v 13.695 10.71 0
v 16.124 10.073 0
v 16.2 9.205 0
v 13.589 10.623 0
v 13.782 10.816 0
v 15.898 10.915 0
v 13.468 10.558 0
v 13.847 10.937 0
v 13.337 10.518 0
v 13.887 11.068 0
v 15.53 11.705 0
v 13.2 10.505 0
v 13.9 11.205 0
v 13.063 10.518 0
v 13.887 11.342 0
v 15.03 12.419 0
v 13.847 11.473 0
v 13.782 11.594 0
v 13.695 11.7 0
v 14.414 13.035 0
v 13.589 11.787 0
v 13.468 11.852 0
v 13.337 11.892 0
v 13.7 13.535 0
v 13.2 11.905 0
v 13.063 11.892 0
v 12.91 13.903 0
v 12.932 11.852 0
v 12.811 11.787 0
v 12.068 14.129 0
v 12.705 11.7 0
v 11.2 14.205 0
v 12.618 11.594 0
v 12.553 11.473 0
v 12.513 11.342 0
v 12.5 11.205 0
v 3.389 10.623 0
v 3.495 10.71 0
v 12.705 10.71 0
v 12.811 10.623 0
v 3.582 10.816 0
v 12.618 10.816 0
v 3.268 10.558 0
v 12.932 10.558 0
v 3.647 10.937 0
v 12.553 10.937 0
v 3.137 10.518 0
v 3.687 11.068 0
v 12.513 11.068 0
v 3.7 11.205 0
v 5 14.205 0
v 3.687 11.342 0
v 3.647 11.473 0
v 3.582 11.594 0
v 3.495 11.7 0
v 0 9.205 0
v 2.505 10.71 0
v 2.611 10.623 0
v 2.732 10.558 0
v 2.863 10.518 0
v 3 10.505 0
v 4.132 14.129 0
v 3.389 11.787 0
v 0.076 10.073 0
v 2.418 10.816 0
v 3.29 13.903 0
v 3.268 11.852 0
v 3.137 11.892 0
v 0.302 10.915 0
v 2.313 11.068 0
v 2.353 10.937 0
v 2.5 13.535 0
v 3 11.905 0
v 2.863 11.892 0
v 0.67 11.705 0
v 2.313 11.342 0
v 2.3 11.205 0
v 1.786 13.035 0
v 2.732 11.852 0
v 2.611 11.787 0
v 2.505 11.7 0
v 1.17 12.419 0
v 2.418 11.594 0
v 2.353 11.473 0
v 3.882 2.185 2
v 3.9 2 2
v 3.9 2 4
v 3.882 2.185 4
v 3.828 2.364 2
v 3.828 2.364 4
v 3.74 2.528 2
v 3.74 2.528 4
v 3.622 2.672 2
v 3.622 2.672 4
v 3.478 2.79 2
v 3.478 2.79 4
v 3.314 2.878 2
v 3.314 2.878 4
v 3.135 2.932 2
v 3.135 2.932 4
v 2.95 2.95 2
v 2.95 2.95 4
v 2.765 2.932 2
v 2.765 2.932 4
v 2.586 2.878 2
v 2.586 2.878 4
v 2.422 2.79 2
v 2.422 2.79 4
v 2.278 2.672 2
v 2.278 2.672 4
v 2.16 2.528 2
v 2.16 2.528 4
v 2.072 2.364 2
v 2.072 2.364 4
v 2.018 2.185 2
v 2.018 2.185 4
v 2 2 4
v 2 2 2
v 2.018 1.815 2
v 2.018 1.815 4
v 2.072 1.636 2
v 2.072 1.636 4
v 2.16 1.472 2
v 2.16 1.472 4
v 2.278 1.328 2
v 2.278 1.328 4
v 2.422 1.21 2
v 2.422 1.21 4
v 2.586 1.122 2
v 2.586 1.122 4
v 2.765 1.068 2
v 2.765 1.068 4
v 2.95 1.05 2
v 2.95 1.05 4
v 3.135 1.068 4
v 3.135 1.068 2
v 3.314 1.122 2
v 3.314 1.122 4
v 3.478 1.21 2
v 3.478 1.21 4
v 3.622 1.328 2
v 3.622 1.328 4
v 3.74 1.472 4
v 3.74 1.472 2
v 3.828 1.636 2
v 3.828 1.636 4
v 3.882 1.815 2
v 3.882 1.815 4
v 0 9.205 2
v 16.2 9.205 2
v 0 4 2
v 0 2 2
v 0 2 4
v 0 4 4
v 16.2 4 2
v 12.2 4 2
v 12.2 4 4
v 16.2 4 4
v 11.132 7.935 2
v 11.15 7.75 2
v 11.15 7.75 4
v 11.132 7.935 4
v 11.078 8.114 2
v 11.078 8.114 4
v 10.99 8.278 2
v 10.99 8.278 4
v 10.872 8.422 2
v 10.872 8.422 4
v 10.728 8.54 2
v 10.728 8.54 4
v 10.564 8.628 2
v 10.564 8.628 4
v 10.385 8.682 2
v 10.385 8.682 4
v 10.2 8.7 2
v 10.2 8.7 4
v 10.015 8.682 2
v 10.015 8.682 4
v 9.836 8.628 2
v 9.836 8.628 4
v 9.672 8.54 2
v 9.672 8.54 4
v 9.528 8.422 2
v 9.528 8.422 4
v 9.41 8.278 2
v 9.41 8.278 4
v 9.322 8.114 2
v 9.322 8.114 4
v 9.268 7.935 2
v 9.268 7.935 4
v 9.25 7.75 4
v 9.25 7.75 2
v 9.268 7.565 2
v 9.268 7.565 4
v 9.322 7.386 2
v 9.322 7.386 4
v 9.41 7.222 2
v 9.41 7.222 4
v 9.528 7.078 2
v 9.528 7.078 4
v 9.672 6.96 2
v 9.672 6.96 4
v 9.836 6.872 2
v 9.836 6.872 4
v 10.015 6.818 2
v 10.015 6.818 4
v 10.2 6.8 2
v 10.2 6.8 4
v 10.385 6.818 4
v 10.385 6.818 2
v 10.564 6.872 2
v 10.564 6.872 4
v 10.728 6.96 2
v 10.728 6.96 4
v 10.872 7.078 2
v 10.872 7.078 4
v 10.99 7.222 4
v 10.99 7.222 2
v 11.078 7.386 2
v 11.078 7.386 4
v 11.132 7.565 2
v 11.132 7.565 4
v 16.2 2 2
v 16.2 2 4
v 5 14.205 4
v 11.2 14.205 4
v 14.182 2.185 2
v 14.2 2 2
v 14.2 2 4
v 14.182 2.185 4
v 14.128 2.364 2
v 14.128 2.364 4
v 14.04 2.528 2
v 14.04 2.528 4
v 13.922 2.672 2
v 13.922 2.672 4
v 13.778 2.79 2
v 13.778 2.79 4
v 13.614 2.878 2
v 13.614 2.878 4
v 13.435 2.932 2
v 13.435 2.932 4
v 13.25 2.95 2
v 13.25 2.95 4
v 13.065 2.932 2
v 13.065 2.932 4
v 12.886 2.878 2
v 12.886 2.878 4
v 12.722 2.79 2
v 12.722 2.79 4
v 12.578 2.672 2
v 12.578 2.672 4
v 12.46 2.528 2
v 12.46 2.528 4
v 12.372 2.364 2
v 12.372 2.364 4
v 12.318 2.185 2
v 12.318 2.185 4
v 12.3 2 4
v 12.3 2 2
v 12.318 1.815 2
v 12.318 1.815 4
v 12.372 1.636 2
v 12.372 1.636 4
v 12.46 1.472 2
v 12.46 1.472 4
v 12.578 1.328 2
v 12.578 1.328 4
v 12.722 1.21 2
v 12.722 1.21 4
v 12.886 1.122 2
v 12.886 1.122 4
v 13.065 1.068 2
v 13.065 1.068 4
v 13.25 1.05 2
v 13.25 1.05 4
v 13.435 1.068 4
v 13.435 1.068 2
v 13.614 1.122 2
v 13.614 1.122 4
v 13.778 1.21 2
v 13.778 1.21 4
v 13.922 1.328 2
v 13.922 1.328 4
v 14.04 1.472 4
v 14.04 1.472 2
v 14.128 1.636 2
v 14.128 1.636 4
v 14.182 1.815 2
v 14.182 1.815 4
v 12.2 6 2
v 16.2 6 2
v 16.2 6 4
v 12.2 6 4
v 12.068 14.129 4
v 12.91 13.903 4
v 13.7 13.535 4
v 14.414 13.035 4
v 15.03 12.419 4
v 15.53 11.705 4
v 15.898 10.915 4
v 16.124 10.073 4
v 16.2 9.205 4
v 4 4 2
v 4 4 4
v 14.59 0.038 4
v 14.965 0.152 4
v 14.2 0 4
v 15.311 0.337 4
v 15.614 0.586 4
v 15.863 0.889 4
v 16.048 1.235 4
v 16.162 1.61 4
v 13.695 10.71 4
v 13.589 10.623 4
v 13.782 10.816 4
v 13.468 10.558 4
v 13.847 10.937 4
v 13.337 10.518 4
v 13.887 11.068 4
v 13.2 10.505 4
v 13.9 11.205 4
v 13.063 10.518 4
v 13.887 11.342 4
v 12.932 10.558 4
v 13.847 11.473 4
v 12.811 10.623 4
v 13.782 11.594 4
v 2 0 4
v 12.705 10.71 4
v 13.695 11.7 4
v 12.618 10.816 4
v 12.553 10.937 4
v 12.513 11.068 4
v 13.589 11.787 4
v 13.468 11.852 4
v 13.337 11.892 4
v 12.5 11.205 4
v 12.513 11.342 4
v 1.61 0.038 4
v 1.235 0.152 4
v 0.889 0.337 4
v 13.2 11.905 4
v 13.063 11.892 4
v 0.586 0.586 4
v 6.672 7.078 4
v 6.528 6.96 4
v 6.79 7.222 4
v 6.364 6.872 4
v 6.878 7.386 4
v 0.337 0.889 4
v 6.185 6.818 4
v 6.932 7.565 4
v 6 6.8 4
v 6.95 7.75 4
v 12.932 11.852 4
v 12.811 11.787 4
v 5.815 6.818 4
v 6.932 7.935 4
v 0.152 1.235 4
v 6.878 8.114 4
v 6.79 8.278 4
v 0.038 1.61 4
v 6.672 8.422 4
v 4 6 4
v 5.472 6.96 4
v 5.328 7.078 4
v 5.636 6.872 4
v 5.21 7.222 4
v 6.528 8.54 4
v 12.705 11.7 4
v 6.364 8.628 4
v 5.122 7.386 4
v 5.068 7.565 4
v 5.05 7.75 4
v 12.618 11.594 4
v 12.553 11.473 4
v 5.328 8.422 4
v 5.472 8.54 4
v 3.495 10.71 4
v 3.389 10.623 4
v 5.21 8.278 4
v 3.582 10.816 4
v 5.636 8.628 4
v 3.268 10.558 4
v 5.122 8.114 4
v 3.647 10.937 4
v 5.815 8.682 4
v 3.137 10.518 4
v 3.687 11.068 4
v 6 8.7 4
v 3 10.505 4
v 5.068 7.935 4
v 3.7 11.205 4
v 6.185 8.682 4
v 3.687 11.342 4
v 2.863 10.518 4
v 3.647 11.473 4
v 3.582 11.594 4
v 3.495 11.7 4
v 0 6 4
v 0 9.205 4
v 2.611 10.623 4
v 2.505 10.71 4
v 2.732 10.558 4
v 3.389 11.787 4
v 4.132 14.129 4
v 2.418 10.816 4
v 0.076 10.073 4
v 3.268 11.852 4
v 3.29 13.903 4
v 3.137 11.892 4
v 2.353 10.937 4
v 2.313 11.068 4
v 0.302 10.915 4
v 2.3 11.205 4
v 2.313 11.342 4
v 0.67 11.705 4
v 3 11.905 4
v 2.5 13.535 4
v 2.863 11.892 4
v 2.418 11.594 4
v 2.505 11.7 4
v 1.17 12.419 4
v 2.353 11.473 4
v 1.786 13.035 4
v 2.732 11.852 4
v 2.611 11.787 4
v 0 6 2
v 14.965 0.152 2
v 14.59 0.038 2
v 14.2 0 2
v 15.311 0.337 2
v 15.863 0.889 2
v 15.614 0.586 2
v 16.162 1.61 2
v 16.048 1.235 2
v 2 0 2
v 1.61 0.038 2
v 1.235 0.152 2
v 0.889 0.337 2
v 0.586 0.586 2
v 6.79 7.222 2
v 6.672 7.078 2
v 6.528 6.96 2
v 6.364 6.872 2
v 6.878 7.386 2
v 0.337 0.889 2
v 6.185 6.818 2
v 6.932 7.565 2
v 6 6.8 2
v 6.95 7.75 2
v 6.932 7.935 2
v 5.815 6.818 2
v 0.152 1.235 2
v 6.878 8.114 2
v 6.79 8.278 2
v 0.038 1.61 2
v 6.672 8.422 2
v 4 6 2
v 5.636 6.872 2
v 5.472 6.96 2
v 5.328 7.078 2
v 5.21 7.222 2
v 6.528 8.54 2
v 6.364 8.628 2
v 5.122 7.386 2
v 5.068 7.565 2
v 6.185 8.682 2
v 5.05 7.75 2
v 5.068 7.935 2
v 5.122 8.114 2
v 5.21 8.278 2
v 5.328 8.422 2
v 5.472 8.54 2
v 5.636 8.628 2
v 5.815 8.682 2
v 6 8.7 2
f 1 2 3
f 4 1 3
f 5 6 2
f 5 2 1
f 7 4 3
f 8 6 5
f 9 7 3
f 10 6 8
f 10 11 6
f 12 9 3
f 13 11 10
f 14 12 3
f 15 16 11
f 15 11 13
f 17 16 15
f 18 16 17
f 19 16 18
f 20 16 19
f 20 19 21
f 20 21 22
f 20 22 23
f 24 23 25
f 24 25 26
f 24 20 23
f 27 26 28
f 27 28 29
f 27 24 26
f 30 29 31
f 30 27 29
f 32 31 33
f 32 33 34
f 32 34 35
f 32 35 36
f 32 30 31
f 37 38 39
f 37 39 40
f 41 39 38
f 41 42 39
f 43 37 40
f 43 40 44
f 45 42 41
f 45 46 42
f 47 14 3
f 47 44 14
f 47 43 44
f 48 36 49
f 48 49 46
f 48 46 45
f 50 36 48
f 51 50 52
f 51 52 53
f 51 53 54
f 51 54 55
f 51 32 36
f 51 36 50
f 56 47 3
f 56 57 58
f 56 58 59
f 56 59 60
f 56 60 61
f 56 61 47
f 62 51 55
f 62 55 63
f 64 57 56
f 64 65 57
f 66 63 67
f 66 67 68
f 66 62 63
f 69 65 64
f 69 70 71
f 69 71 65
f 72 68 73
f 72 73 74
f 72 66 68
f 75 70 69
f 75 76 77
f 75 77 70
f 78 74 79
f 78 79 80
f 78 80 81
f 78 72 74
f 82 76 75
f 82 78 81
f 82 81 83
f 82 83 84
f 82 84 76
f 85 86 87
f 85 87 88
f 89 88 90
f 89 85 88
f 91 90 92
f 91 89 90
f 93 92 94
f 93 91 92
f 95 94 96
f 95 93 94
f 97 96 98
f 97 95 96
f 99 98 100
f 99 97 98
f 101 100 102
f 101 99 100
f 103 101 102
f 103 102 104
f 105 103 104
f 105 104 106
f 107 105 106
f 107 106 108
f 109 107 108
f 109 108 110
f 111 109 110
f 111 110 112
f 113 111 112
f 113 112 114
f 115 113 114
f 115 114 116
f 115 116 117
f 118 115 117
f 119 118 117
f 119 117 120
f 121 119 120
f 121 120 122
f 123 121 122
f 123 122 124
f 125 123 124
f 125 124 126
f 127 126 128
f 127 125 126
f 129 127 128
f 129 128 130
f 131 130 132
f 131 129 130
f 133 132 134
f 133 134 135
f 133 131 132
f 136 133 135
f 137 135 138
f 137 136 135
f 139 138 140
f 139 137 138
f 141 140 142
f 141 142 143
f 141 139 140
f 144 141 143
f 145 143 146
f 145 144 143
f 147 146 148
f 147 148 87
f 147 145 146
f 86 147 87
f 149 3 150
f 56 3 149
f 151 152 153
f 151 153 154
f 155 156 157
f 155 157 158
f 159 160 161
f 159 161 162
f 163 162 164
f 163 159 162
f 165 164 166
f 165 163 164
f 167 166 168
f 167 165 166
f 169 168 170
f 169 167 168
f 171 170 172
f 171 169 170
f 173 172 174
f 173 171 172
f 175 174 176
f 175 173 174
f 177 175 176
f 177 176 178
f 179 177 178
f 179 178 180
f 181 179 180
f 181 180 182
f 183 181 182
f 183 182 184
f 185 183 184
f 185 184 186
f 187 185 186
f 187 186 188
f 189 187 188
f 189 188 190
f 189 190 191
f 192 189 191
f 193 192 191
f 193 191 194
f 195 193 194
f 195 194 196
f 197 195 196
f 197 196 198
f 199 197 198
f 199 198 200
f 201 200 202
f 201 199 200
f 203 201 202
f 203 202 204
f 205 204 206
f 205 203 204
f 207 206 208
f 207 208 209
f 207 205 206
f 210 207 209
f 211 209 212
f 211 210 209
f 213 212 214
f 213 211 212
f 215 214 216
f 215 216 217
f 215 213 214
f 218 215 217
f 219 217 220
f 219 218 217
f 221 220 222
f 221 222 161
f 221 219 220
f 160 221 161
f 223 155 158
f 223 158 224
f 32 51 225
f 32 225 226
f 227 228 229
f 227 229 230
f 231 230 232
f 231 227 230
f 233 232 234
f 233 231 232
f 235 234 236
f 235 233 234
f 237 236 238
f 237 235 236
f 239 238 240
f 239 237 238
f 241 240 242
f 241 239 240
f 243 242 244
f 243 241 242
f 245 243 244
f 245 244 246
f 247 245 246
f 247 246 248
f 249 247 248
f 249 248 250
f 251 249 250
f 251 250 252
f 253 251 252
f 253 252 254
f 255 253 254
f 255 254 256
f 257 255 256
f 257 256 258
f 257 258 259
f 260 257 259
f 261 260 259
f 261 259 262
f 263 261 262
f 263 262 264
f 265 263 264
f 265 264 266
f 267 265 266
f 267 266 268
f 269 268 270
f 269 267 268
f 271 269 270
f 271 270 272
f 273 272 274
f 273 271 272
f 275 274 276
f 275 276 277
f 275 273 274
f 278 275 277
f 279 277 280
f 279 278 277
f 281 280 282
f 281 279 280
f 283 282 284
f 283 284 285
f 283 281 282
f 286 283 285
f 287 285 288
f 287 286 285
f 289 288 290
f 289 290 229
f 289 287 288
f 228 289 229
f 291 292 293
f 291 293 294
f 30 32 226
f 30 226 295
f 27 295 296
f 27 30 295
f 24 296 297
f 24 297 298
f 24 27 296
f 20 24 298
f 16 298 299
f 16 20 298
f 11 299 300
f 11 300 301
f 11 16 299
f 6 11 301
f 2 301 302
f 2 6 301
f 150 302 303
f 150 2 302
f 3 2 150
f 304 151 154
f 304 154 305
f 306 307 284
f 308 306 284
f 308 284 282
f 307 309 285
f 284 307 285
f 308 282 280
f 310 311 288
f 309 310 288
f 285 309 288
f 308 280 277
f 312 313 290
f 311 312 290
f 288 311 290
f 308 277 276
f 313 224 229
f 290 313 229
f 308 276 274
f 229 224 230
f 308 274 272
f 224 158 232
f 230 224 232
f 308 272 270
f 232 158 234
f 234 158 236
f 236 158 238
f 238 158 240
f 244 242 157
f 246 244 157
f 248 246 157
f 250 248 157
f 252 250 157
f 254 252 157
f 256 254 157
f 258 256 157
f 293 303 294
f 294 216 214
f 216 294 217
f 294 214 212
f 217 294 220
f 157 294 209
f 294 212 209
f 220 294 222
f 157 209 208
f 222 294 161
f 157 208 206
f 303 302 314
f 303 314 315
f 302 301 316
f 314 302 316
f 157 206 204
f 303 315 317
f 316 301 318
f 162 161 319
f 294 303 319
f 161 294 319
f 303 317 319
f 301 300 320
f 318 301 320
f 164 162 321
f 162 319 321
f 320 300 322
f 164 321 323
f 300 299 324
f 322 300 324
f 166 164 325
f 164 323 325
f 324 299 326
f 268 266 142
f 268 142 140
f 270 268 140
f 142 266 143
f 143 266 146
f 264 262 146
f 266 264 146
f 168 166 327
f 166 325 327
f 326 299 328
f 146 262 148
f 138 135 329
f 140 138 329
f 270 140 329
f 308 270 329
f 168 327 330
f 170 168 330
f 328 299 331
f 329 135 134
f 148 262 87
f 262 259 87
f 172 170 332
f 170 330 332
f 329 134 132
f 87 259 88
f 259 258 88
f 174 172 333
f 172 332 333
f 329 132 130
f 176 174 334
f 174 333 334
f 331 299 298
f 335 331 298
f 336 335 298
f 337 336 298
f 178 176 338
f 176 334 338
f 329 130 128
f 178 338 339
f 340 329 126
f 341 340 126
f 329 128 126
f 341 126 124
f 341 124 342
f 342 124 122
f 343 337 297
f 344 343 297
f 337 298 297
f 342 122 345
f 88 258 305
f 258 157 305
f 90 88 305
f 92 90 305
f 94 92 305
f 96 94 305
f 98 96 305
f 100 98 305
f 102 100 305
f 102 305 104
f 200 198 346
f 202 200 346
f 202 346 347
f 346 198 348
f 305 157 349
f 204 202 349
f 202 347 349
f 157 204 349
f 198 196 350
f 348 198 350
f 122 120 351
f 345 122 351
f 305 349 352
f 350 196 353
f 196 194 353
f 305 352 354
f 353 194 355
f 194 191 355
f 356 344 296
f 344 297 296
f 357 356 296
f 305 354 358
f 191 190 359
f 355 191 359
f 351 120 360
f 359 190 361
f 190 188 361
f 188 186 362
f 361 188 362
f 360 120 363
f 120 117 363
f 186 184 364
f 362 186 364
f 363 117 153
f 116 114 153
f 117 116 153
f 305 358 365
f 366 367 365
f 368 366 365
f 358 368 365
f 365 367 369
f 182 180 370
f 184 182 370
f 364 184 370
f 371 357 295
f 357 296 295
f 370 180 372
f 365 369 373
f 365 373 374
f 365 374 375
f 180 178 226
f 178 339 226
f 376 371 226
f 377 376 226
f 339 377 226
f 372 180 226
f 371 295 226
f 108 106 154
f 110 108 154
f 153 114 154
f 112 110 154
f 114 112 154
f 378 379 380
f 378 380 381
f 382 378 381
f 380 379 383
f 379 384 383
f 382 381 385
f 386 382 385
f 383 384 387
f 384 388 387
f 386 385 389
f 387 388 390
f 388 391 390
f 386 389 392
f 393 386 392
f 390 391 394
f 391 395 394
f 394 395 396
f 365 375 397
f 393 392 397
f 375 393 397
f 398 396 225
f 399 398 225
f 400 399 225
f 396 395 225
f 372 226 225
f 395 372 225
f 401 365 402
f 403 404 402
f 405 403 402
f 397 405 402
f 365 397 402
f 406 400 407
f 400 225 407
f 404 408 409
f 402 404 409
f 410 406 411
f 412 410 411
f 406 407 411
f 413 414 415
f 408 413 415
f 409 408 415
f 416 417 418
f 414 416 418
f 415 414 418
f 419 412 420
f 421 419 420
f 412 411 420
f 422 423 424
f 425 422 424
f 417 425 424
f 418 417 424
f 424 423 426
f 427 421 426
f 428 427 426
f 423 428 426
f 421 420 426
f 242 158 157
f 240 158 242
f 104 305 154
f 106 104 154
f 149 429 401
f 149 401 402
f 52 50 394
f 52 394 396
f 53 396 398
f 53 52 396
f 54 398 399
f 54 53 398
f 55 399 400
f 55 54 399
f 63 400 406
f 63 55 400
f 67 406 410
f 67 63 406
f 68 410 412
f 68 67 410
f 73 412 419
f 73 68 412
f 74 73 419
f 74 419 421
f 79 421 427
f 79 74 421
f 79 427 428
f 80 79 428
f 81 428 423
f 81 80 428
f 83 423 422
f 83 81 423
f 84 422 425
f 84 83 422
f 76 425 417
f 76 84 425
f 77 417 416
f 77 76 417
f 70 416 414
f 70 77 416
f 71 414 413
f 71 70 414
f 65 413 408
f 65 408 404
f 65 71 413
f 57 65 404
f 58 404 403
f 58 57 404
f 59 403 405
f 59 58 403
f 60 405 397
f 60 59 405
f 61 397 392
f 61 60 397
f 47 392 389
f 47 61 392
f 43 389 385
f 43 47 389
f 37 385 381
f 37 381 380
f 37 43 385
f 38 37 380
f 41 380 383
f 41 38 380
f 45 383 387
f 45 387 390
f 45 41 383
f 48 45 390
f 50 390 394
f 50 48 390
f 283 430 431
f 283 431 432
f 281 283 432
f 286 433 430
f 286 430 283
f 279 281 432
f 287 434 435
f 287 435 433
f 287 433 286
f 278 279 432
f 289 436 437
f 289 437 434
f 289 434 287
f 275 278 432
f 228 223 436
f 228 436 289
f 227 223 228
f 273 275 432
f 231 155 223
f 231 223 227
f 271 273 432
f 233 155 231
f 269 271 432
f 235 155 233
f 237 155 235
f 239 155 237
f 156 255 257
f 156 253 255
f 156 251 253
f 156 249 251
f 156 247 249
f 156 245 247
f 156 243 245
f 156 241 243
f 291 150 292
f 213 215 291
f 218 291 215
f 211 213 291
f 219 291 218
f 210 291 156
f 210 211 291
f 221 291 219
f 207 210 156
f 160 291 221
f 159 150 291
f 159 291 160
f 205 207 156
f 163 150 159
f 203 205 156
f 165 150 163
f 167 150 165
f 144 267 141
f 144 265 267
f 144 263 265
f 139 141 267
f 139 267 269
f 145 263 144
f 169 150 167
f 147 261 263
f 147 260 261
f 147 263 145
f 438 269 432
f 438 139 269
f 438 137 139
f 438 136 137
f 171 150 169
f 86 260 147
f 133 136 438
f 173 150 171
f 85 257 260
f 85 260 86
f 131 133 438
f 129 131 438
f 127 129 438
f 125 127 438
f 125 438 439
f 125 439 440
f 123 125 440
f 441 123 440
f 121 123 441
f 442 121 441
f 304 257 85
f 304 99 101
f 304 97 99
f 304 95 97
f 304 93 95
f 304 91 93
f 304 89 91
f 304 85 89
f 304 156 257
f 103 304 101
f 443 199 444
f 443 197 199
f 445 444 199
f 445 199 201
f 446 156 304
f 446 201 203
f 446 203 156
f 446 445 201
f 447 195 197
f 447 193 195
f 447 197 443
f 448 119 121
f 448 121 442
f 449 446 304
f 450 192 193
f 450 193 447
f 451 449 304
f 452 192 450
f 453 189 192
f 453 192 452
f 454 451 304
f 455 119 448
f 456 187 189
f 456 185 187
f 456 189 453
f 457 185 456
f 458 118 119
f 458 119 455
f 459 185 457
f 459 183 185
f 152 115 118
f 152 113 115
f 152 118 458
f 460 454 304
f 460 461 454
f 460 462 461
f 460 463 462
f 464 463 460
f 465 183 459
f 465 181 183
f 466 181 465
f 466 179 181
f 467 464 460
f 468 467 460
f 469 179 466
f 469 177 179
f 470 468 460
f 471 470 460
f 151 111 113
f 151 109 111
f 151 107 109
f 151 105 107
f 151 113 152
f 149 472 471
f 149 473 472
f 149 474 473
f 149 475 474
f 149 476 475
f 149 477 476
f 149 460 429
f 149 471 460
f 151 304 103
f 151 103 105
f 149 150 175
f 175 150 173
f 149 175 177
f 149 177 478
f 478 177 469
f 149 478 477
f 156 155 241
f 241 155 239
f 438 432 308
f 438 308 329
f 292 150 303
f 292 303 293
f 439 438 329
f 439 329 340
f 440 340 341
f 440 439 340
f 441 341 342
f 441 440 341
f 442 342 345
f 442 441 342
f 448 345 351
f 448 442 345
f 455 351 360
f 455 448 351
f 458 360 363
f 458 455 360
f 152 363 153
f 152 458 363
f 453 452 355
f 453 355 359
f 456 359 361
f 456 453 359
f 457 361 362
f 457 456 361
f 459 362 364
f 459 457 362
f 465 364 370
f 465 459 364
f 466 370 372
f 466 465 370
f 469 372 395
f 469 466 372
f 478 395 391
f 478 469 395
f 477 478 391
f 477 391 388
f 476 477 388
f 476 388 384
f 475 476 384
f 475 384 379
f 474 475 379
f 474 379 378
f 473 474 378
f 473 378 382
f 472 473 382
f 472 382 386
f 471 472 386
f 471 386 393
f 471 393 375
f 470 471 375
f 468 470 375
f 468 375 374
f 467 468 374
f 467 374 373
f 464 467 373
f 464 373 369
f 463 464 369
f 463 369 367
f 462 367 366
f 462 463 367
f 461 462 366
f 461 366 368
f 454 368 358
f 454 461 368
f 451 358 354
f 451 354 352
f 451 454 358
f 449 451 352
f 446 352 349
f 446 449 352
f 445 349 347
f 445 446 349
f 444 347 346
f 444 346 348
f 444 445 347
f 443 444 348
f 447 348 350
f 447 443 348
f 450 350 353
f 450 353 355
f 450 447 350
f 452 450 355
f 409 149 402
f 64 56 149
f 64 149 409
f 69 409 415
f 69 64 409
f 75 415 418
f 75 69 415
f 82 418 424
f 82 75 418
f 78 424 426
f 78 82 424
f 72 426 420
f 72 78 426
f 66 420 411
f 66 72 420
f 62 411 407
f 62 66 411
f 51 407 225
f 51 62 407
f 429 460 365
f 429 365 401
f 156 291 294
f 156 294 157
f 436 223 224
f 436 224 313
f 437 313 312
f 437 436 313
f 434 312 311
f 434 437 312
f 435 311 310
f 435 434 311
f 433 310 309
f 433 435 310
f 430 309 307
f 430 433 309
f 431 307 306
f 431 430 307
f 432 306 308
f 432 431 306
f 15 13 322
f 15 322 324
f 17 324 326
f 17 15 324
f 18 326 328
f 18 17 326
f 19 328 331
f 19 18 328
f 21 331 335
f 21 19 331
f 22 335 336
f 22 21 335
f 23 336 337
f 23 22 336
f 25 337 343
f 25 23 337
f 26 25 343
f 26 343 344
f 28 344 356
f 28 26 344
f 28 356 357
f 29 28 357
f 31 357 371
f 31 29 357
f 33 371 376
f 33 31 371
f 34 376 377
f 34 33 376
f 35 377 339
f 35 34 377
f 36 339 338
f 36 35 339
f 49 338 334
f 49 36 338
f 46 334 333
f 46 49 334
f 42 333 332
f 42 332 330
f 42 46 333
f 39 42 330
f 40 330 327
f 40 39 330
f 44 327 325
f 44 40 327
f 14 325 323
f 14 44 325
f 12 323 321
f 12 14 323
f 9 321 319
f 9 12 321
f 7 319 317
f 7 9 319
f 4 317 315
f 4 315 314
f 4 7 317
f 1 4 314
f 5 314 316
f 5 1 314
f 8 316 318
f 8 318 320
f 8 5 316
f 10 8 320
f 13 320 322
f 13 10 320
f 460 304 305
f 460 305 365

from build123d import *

# Parameters (mm, degrees)
SKETCH1_R           = 0.95
SKETCH1_R_2         = 0.7
BOSS_EXTRUDE1_DEPTH = 4
SKETCH2_W           = 16.2
SKETCH2_H           = 9.205
CUT_EXTRUDE1_DEPTH  = 2


with BuildPart() as part:
    # Sketch1 → Boss-Extrude1 (new body)
    with BuildSketch(Plane.XY):
        with BuildLine():
            Line((12.2, 4), (16.2, 4))
            Line((16.2, 4), (16.2, 2))
            ThreePointArc((16.2, 2), (15.614213562, 0.585786438), (14.2, 0))
            Line((14.2, 0), (2, 0))
            ThreePointArc((2, 0), (0.585786438, 0.585786438), (0, 2))
            Line((0, 2), (0, 4))
            Line((0, 4), (4, 4))
            Line((4, 4), (4, 6))
            Line((4, 6), (0, 6))
            Line((0, 6), (0, 9.205))
            ThreePointArc((0, 9.205), (1.464466094, 12.740533906), (5, 14.205))
            Line((5, 14.205), (11.2, 14.205))
            ThreePointArc((11.2, 14.205), (14.735533906, 12.740533906), (16.2, 9.205))
            Line((16.2, 9.205), (16.2, 6))
            Line((16.2, 6), (12.2, 6))
            Line((12.2, 6), (12.2, 4))
        make_face()
        with Locations((13.25, 2)):
            Circle(SKETCH1_R, mode=Mode.SUBTRACT)
        with Locations((13.2, 11.205)):
            Circle(SKETCH1_R_2, mode=Mode.SUBTRACT)
        with Locations((10.2, 7.75)):
            Circle(SKETCH1_R, mode=Mode.SUBTRACT)
        with Locations((6, 7.75)):
            Circle(SKETCH1_R, mode=Mode.SUBTRACT)
        with Locations((3, 11.205)):
            Circle(SKETCH1_R_2, mode=Mode.SUBTRACT)
        with Locations((2.95, 2)):
            Circle(SKETCH1_R, mode=Mode.SUBTRACT)
    extrude(amount=BOSS_EXTRUDE1_DEPTH)

    # Sketch2 → Cut-Extrude1 (cut)
    with BuildSketch(Plane(origin=(0, 0, 0), x_dir=(-1, 0, 0), z_dir=(0, 0, -1))):
        with Locations((-8.1, 4.6025)):
            Rectangle(SKETCH2_W, SKETCH2_H)
    extrude(amount=-CUT_EXTRUDE1_DEPTH, mode=Mode.SUBTRACT)


solid = part.part
